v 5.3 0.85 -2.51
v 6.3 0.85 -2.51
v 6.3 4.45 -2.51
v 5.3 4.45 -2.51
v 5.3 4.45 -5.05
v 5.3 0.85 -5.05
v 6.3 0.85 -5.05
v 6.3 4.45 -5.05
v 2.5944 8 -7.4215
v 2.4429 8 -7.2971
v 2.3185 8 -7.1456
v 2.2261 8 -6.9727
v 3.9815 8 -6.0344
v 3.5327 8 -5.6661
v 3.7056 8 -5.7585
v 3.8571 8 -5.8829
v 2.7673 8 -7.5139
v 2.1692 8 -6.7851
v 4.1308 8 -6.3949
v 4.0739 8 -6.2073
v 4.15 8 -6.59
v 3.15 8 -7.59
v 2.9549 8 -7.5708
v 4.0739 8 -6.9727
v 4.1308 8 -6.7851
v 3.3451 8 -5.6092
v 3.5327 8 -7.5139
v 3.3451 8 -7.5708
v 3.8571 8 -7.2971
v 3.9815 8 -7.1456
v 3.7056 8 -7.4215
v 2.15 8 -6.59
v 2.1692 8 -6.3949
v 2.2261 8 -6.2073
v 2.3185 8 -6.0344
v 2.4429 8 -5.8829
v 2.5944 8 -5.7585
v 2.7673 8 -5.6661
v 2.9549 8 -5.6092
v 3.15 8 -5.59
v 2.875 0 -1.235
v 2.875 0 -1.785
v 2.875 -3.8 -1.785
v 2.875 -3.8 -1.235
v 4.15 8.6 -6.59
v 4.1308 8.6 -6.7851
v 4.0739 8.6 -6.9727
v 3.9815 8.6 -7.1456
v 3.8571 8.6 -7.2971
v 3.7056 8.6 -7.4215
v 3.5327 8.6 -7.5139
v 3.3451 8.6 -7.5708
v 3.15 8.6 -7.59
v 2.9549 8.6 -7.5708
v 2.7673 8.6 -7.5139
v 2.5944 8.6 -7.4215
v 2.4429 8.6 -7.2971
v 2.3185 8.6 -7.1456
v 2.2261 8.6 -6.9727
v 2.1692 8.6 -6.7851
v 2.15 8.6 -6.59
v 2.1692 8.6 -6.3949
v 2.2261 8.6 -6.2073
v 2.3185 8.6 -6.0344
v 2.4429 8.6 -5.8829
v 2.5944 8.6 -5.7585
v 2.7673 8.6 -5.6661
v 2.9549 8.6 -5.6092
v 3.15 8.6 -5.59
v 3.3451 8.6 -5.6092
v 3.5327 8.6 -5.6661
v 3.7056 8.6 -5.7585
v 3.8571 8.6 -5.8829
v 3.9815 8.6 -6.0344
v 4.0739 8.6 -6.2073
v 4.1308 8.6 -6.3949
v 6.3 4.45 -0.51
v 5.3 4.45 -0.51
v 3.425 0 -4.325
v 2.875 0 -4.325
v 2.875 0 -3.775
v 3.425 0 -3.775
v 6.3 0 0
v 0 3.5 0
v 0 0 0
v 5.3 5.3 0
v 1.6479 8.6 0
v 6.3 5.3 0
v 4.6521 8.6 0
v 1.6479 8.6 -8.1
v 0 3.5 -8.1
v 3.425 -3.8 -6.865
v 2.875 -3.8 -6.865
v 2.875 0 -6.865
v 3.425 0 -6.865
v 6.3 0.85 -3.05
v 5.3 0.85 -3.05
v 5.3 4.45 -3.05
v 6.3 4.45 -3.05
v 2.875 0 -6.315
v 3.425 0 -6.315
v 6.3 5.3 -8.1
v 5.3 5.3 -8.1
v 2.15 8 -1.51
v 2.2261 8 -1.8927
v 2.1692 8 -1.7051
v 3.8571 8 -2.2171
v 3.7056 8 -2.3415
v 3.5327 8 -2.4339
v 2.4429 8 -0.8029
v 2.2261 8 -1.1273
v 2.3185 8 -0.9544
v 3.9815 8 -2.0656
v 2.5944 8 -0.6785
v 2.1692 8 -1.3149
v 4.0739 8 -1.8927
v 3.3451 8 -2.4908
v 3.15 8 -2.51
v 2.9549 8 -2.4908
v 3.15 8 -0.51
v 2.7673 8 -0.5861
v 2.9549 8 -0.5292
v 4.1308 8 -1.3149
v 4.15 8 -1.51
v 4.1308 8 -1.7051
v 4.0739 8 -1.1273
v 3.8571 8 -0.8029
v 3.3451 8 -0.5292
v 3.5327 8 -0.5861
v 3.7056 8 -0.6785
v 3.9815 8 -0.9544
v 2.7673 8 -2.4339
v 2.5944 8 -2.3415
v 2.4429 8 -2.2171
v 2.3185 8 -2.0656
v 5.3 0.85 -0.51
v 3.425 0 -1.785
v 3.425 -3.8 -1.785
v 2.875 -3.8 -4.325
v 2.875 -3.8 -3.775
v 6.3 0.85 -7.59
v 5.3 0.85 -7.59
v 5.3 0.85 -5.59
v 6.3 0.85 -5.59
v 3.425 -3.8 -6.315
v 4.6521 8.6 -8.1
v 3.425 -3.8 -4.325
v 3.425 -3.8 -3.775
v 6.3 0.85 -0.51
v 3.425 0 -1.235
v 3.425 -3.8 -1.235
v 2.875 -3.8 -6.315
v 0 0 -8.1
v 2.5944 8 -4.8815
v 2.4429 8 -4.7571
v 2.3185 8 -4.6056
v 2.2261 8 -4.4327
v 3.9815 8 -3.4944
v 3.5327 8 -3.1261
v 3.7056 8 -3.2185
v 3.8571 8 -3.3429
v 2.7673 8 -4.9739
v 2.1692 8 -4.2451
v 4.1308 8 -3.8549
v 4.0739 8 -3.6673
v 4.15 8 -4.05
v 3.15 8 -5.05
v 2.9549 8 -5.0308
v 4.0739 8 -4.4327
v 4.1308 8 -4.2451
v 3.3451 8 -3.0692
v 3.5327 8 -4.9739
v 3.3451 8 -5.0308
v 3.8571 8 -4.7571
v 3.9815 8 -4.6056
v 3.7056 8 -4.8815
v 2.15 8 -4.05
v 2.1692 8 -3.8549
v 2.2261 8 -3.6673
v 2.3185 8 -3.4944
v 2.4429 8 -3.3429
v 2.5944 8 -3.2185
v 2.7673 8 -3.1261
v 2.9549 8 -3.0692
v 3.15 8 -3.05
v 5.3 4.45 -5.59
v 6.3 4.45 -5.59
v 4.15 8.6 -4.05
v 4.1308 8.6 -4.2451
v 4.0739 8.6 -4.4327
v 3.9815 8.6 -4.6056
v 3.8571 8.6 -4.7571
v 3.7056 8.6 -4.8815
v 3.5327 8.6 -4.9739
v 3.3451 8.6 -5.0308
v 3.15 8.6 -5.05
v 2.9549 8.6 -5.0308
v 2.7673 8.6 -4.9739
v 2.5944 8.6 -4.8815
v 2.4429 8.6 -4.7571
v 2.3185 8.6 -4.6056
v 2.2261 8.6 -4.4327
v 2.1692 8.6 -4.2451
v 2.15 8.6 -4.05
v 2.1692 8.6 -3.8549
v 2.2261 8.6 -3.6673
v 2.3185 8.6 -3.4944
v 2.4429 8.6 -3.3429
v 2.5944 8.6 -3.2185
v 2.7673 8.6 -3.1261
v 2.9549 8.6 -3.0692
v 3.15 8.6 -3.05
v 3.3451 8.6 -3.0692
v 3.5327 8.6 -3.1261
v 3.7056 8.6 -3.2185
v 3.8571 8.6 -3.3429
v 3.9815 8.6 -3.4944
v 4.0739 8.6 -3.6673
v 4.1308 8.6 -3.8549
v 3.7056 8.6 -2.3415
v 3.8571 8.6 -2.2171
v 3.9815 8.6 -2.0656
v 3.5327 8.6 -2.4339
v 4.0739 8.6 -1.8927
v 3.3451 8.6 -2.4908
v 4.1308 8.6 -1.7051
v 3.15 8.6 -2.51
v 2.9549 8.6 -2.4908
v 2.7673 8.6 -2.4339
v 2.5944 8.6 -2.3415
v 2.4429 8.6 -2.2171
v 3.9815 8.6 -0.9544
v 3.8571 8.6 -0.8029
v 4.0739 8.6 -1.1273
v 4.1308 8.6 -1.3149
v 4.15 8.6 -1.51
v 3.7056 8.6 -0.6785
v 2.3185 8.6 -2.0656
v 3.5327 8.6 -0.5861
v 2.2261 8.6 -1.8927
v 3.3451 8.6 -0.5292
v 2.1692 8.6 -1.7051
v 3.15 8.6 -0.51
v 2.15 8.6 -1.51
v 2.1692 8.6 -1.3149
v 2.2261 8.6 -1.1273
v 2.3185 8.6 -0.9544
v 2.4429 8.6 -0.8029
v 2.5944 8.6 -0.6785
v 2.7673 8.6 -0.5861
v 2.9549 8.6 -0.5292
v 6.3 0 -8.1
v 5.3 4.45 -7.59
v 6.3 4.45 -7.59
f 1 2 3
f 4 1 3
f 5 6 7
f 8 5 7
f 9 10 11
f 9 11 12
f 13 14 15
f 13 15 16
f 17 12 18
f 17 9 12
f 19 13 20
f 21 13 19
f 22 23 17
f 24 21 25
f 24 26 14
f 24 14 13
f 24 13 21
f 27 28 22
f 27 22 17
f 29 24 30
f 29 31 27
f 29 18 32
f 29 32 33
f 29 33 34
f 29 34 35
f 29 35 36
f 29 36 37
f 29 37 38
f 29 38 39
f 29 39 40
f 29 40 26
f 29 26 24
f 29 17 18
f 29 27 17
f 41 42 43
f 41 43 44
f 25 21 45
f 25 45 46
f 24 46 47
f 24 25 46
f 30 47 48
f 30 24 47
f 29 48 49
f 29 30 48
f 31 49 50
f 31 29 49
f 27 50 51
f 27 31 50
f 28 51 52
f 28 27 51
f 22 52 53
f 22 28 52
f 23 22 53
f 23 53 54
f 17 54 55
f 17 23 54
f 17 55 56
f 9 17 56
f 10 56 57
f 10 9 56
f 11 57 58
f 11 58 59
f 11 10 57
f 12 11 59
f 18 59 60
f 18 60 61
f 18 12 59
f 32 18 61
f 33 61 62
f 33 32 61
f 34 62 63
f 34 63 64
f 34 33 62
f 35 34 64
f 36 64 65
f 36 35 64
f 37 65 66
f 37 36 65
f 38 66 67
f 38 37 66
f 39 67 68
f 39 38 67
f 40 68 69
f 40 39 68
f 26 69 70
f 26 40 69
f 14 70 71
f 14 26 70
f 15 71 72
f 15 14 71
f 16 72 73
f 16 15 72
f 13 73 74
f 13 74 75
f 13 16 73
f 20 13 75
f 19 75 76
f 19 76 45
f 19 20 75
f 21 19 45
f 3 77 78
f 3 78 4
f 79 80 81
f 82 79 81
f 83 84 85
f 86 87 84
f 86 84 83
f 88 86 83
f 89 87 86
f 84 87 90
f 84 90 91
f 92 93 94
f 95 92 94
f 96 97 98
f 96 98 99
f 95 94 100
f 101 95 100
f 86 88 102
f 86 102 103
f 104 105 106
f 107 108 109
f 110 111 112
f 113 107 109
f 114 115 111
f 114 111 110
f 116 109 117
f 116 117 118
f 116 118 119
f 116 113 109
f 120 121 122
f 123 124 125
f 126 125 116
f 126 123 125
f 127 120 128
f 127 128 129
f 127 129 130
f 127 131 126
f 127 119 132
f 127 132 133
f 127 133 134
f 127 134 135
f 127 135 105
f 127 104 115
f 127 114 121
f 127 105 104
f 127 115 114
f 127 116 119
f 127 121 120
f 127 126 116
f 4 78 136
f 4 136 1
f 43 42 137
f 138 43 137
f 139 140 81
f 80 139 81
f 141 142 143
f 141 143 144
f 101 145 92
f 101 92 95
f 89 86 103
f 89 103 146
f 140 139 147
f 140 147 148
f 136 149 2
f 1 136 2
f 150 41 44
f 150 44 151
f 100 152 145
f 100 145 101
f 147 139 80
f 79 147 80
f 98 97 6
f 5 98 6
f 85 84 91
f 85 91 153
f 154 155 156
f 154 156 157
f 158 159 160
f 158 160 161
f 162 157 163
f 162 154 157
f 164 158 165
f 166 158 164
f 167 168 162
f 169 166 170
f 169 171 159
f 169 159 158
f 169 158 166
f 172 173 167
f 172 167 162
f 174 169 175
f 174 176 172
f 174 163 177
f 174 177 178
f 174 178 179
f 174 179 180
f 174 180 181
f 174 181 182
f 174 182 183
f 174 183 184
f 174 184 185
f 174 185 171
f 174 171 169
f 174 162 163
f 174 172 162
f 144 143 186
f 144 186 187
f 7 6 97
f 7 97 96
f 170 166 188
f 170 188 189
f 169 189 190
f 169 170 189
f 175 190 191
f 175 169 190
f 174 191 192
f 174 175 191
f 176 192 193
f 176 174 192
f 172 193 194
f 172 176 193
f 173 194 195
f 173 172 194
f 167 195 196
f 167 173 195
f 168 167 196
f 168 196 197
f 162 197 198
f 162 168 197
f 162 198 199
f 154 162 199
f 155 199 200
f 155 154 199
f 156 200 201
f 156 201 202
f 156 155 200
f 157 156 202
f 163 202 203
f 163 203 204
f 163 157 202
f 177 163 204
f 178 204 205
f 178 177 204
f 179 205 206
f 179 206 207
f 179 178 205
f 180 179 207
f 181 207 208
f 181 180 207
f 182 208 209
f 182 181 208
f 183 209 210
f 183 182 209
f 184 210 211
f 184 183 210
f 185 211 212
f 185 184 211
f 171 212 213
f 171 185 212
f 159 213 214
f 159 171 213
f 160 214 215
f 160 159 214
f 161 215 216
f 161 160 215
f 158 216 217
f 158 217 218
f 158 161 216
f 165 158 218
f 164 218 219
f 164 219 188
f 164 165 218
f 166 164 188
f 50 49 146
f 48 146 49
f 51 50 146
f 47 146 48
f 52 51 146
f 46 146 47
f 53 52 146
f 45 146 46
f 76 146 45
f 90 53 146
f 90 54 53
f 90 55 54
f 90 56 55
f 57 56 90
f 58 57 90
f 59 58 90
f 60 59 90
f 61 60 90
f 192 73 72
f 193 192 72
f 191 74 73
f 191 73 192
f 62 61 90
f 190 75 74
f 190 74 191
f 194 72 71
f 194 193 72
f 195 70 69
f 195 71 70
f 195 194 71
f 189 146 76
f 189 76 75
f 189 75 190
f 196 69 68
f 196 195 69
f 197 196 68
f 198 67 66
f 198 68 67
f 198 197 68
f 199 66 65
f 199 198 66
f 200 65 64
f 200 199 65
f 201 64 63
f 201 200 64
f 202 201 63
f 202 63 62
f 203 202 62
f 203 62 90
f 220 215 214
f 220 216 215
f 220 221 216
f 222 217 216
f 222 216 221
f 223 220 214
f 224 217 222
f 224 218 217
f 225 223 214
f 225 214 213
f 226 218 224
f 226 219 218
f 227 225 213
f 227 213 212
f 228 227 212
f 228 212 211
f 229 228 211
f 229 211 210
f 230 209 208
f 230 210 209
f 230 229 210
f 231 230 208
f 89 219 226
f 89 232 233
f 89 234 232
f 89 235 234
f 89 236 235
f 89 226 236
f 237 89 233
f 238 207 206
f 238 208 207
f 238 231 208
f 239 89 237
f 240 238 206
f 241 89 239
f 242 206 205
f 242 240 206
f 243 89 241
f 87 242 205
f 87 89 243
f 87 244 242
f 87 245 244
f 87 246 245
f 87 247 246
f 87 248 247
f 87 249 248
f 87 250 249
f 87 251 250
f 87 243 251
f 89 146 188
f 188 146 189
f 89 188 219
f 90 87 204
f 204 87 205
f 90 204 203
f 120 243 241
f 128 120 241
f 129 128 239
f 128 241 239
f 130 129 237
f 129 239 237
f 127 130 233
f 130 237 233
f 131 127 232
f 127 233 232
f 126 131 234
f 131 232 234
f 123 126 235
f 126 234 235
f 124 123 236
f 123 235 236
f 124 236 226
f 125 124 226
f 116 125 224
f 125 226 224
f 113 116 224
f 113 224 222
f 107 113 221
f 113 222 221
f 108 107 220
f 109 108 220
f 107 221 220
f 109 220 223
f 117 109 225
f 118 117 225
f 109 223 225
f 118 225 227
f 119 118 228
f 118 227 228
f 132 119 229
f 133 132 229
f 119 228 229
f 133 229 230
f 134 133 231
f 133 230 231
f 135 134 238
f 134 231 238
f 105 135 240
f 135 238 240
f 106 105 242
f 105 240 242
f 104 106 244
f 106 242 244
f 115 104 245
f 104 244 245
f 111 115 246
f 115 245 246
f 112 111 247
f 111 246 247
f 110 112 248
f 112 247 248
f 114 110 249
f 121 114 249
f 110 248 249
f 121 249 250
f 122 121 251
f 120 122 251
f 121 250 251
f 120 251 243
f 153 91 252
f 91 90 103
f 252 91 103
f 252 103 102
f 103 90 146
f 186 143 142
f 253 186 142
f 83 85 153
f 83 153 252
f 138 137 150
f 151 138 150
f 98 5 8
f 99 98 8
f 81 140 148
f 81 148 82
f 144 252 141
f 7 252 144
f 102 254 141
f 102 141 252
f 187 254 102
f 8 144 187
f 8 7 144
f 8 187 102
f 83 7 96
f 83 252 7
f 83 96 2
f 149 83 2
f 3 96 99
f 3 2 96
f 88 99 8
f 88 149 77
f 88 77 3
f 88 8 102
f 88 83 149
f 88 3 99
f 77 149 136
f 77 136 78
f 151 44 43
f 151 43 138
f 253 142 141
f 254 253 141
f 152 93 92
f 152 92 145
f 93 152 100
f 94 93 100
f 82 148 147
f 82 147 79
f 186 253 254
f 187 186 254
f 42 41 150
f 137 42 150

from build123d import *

# Parameters (mm, degrees)
BOSS_EXTRUDE1_DEPTH   = 8.1
SKETCH3_R             = 1
CUT_EXTRUDE1_DEPTH    = 0.6
SKETCH4_W             = 2
SKETCH4_H             = 3.6
CUT_EXTRUDE2_DEPTH    = 1
SKETCH5_W             = 0.55
SKETCH5_H             = 0.55
BOSS_EXTRUDE2_DEPTH   = 3.8
LPATTERN1_START       = 2.875
LPATTERN1_OUTLINE_W   = 3.8
LPATTERN1_OUTLINE_H   = 0.55
LPATTERN1_DEPTH       = 0.55
LPATTERN1_2_OUTLINE_W = 3.8
LPATTERN1_2_OUTLINE_H = 0.55
LPATTERN1_2_DEPTH     = 0.55
LPATTERN1_START_2     = 0.85
LPATTERN1_3_OUTLINE_W = 1
LPATTERN1_3_OUTLINE_H = 2
LPATTERN1_3_DEPTH     = 3.6
LPATTERN1_START_3     = 8
LPATTERN1_4_OUTLINE_R = 1
LPATTERN1_4_DEPTH     = 0.6


# Read off the part's stored shape, not the designer's step: LPattern1
with BuildPart() as part:
    # Sketch2 → Boss-Extrude1 (new body)
    with BuildSketch(Plane.XY):
        Polygon((6.3, 5.3), (5.3, 5.3), (4.652088092, 8.6), (1.647911908, 8.6), (0, 3.5), (0, 0), (6.3, 0), align=None)
    extrude(amount=-BOSS_EXTRUDE1_DEPTH)

    # Sketch3 → Cut-Extrude1 (cut)
    with BuildSketch(Plane(origin=(0, 8.6, 0), x_dir=(1, 0, 0), z_dir=(0, 1, 0))):
        with Locations(Location((3.15, 1.51, 0), (0, 0, 270))):
            Circle(SKETCH3_R)
    extrude(amount=-CUT_EXTRUDE1_DEPTH, mode=Mode.SUBTRACT)

    # Sketch4 → Cut-Extrude2 (cut)
    with BuildSketch(Plane(origin=(6.3, 0, 0), x_dir=(0, 0, -1), z_dir=(1, 0, 0))):
        with Locations((1.51, 2.65)):
            Rectangle(SKETCH4_W, SKETCH4_H)
    extrude(amount=-CUT_EXTRUDE2_DEPTH, mode=Mode.SUBTRACT)

    # LPattern1 3 outline → LPattern1 3 (cut)
    with BuildSketch(Plane(origin=(0, 0, 0), x_dir=(1, 0, 0), z_dir=(0, 1, 0)).offset(LPATTERN1_START_2)):
        with Locations((5.8, 6.59)):
            Rectangle(LPATTERN1_3_OUTLINE_W, LPATTERN1_3_OUTLINE_H)
        with Locations((5.8, 4.05)):
            Rectangle(LPATTERN1_3_OUTLINE_W, LPATTERN1_3_OUTLINE_H)
    extrude(amount=LPATTERN1_3_DEPTH, mode=Mode.SUBTRACT)

    # LPattern1 4 outline → LPattern1 4 (cut)
    with BuildSketch(Plane(origin=(0, 0, 0), x_dir=(1, 0, 0), z_dir=(0, 1, 0)).offset(LPATTERN1_START_3)):
        with Locations((3.15, 6.59)):
            Circle(LPATTERN1_4_OUTLINE_R)
        with Locations((3.15, 4.05)):
            Circle(LPATTERN1_4_OUTLINE_R)
    extrude(amount=LPATTERN1_4_DEPTH, mode=Mode.SUBTRACT)


with BuildPart() as body_2:
    # Sketch5 → Boss-Extrude2 (new body)
    with BuildSketch(Plane.XZ):
        with Locations((3.15, -1.51)):
            Rectangle(SKETCH5_W, SKETCH5_H)
    extrude(amount=BOSS_EXTRUDE2_DEPTH)


with BuildPart() as body_3:
    # LPattern1 outline → LPattern1 (new body)
    with BuildSketch(Plane.YZ.offset(LPATTERN1_START)):
        with Locations((-1.9, -6.59)):
            Rectangle(LPATTERN1_OUTLINE_W, LPATTERN1_OUTLINE_H)
    extrude(amount=LPATTERN1_DEPTH)


with BuildPart() as body_4:
    # LPattern1 2 outline → LPattern1 2 (new body)
    with BuildSketch(Plane.YZ.offset(LPATTERN1_START)):
        with Locations((-1.9, -4.05)):
            Rectangle(LPATTERN1_2_OUTLINE_W, LPATTERN1_2_OUTLINE_H)
    extrude(amount=LPATTERN1_2_DEPTH)


solid = Compound([part.part, body_2.part, body_3.part, body_4.part])
